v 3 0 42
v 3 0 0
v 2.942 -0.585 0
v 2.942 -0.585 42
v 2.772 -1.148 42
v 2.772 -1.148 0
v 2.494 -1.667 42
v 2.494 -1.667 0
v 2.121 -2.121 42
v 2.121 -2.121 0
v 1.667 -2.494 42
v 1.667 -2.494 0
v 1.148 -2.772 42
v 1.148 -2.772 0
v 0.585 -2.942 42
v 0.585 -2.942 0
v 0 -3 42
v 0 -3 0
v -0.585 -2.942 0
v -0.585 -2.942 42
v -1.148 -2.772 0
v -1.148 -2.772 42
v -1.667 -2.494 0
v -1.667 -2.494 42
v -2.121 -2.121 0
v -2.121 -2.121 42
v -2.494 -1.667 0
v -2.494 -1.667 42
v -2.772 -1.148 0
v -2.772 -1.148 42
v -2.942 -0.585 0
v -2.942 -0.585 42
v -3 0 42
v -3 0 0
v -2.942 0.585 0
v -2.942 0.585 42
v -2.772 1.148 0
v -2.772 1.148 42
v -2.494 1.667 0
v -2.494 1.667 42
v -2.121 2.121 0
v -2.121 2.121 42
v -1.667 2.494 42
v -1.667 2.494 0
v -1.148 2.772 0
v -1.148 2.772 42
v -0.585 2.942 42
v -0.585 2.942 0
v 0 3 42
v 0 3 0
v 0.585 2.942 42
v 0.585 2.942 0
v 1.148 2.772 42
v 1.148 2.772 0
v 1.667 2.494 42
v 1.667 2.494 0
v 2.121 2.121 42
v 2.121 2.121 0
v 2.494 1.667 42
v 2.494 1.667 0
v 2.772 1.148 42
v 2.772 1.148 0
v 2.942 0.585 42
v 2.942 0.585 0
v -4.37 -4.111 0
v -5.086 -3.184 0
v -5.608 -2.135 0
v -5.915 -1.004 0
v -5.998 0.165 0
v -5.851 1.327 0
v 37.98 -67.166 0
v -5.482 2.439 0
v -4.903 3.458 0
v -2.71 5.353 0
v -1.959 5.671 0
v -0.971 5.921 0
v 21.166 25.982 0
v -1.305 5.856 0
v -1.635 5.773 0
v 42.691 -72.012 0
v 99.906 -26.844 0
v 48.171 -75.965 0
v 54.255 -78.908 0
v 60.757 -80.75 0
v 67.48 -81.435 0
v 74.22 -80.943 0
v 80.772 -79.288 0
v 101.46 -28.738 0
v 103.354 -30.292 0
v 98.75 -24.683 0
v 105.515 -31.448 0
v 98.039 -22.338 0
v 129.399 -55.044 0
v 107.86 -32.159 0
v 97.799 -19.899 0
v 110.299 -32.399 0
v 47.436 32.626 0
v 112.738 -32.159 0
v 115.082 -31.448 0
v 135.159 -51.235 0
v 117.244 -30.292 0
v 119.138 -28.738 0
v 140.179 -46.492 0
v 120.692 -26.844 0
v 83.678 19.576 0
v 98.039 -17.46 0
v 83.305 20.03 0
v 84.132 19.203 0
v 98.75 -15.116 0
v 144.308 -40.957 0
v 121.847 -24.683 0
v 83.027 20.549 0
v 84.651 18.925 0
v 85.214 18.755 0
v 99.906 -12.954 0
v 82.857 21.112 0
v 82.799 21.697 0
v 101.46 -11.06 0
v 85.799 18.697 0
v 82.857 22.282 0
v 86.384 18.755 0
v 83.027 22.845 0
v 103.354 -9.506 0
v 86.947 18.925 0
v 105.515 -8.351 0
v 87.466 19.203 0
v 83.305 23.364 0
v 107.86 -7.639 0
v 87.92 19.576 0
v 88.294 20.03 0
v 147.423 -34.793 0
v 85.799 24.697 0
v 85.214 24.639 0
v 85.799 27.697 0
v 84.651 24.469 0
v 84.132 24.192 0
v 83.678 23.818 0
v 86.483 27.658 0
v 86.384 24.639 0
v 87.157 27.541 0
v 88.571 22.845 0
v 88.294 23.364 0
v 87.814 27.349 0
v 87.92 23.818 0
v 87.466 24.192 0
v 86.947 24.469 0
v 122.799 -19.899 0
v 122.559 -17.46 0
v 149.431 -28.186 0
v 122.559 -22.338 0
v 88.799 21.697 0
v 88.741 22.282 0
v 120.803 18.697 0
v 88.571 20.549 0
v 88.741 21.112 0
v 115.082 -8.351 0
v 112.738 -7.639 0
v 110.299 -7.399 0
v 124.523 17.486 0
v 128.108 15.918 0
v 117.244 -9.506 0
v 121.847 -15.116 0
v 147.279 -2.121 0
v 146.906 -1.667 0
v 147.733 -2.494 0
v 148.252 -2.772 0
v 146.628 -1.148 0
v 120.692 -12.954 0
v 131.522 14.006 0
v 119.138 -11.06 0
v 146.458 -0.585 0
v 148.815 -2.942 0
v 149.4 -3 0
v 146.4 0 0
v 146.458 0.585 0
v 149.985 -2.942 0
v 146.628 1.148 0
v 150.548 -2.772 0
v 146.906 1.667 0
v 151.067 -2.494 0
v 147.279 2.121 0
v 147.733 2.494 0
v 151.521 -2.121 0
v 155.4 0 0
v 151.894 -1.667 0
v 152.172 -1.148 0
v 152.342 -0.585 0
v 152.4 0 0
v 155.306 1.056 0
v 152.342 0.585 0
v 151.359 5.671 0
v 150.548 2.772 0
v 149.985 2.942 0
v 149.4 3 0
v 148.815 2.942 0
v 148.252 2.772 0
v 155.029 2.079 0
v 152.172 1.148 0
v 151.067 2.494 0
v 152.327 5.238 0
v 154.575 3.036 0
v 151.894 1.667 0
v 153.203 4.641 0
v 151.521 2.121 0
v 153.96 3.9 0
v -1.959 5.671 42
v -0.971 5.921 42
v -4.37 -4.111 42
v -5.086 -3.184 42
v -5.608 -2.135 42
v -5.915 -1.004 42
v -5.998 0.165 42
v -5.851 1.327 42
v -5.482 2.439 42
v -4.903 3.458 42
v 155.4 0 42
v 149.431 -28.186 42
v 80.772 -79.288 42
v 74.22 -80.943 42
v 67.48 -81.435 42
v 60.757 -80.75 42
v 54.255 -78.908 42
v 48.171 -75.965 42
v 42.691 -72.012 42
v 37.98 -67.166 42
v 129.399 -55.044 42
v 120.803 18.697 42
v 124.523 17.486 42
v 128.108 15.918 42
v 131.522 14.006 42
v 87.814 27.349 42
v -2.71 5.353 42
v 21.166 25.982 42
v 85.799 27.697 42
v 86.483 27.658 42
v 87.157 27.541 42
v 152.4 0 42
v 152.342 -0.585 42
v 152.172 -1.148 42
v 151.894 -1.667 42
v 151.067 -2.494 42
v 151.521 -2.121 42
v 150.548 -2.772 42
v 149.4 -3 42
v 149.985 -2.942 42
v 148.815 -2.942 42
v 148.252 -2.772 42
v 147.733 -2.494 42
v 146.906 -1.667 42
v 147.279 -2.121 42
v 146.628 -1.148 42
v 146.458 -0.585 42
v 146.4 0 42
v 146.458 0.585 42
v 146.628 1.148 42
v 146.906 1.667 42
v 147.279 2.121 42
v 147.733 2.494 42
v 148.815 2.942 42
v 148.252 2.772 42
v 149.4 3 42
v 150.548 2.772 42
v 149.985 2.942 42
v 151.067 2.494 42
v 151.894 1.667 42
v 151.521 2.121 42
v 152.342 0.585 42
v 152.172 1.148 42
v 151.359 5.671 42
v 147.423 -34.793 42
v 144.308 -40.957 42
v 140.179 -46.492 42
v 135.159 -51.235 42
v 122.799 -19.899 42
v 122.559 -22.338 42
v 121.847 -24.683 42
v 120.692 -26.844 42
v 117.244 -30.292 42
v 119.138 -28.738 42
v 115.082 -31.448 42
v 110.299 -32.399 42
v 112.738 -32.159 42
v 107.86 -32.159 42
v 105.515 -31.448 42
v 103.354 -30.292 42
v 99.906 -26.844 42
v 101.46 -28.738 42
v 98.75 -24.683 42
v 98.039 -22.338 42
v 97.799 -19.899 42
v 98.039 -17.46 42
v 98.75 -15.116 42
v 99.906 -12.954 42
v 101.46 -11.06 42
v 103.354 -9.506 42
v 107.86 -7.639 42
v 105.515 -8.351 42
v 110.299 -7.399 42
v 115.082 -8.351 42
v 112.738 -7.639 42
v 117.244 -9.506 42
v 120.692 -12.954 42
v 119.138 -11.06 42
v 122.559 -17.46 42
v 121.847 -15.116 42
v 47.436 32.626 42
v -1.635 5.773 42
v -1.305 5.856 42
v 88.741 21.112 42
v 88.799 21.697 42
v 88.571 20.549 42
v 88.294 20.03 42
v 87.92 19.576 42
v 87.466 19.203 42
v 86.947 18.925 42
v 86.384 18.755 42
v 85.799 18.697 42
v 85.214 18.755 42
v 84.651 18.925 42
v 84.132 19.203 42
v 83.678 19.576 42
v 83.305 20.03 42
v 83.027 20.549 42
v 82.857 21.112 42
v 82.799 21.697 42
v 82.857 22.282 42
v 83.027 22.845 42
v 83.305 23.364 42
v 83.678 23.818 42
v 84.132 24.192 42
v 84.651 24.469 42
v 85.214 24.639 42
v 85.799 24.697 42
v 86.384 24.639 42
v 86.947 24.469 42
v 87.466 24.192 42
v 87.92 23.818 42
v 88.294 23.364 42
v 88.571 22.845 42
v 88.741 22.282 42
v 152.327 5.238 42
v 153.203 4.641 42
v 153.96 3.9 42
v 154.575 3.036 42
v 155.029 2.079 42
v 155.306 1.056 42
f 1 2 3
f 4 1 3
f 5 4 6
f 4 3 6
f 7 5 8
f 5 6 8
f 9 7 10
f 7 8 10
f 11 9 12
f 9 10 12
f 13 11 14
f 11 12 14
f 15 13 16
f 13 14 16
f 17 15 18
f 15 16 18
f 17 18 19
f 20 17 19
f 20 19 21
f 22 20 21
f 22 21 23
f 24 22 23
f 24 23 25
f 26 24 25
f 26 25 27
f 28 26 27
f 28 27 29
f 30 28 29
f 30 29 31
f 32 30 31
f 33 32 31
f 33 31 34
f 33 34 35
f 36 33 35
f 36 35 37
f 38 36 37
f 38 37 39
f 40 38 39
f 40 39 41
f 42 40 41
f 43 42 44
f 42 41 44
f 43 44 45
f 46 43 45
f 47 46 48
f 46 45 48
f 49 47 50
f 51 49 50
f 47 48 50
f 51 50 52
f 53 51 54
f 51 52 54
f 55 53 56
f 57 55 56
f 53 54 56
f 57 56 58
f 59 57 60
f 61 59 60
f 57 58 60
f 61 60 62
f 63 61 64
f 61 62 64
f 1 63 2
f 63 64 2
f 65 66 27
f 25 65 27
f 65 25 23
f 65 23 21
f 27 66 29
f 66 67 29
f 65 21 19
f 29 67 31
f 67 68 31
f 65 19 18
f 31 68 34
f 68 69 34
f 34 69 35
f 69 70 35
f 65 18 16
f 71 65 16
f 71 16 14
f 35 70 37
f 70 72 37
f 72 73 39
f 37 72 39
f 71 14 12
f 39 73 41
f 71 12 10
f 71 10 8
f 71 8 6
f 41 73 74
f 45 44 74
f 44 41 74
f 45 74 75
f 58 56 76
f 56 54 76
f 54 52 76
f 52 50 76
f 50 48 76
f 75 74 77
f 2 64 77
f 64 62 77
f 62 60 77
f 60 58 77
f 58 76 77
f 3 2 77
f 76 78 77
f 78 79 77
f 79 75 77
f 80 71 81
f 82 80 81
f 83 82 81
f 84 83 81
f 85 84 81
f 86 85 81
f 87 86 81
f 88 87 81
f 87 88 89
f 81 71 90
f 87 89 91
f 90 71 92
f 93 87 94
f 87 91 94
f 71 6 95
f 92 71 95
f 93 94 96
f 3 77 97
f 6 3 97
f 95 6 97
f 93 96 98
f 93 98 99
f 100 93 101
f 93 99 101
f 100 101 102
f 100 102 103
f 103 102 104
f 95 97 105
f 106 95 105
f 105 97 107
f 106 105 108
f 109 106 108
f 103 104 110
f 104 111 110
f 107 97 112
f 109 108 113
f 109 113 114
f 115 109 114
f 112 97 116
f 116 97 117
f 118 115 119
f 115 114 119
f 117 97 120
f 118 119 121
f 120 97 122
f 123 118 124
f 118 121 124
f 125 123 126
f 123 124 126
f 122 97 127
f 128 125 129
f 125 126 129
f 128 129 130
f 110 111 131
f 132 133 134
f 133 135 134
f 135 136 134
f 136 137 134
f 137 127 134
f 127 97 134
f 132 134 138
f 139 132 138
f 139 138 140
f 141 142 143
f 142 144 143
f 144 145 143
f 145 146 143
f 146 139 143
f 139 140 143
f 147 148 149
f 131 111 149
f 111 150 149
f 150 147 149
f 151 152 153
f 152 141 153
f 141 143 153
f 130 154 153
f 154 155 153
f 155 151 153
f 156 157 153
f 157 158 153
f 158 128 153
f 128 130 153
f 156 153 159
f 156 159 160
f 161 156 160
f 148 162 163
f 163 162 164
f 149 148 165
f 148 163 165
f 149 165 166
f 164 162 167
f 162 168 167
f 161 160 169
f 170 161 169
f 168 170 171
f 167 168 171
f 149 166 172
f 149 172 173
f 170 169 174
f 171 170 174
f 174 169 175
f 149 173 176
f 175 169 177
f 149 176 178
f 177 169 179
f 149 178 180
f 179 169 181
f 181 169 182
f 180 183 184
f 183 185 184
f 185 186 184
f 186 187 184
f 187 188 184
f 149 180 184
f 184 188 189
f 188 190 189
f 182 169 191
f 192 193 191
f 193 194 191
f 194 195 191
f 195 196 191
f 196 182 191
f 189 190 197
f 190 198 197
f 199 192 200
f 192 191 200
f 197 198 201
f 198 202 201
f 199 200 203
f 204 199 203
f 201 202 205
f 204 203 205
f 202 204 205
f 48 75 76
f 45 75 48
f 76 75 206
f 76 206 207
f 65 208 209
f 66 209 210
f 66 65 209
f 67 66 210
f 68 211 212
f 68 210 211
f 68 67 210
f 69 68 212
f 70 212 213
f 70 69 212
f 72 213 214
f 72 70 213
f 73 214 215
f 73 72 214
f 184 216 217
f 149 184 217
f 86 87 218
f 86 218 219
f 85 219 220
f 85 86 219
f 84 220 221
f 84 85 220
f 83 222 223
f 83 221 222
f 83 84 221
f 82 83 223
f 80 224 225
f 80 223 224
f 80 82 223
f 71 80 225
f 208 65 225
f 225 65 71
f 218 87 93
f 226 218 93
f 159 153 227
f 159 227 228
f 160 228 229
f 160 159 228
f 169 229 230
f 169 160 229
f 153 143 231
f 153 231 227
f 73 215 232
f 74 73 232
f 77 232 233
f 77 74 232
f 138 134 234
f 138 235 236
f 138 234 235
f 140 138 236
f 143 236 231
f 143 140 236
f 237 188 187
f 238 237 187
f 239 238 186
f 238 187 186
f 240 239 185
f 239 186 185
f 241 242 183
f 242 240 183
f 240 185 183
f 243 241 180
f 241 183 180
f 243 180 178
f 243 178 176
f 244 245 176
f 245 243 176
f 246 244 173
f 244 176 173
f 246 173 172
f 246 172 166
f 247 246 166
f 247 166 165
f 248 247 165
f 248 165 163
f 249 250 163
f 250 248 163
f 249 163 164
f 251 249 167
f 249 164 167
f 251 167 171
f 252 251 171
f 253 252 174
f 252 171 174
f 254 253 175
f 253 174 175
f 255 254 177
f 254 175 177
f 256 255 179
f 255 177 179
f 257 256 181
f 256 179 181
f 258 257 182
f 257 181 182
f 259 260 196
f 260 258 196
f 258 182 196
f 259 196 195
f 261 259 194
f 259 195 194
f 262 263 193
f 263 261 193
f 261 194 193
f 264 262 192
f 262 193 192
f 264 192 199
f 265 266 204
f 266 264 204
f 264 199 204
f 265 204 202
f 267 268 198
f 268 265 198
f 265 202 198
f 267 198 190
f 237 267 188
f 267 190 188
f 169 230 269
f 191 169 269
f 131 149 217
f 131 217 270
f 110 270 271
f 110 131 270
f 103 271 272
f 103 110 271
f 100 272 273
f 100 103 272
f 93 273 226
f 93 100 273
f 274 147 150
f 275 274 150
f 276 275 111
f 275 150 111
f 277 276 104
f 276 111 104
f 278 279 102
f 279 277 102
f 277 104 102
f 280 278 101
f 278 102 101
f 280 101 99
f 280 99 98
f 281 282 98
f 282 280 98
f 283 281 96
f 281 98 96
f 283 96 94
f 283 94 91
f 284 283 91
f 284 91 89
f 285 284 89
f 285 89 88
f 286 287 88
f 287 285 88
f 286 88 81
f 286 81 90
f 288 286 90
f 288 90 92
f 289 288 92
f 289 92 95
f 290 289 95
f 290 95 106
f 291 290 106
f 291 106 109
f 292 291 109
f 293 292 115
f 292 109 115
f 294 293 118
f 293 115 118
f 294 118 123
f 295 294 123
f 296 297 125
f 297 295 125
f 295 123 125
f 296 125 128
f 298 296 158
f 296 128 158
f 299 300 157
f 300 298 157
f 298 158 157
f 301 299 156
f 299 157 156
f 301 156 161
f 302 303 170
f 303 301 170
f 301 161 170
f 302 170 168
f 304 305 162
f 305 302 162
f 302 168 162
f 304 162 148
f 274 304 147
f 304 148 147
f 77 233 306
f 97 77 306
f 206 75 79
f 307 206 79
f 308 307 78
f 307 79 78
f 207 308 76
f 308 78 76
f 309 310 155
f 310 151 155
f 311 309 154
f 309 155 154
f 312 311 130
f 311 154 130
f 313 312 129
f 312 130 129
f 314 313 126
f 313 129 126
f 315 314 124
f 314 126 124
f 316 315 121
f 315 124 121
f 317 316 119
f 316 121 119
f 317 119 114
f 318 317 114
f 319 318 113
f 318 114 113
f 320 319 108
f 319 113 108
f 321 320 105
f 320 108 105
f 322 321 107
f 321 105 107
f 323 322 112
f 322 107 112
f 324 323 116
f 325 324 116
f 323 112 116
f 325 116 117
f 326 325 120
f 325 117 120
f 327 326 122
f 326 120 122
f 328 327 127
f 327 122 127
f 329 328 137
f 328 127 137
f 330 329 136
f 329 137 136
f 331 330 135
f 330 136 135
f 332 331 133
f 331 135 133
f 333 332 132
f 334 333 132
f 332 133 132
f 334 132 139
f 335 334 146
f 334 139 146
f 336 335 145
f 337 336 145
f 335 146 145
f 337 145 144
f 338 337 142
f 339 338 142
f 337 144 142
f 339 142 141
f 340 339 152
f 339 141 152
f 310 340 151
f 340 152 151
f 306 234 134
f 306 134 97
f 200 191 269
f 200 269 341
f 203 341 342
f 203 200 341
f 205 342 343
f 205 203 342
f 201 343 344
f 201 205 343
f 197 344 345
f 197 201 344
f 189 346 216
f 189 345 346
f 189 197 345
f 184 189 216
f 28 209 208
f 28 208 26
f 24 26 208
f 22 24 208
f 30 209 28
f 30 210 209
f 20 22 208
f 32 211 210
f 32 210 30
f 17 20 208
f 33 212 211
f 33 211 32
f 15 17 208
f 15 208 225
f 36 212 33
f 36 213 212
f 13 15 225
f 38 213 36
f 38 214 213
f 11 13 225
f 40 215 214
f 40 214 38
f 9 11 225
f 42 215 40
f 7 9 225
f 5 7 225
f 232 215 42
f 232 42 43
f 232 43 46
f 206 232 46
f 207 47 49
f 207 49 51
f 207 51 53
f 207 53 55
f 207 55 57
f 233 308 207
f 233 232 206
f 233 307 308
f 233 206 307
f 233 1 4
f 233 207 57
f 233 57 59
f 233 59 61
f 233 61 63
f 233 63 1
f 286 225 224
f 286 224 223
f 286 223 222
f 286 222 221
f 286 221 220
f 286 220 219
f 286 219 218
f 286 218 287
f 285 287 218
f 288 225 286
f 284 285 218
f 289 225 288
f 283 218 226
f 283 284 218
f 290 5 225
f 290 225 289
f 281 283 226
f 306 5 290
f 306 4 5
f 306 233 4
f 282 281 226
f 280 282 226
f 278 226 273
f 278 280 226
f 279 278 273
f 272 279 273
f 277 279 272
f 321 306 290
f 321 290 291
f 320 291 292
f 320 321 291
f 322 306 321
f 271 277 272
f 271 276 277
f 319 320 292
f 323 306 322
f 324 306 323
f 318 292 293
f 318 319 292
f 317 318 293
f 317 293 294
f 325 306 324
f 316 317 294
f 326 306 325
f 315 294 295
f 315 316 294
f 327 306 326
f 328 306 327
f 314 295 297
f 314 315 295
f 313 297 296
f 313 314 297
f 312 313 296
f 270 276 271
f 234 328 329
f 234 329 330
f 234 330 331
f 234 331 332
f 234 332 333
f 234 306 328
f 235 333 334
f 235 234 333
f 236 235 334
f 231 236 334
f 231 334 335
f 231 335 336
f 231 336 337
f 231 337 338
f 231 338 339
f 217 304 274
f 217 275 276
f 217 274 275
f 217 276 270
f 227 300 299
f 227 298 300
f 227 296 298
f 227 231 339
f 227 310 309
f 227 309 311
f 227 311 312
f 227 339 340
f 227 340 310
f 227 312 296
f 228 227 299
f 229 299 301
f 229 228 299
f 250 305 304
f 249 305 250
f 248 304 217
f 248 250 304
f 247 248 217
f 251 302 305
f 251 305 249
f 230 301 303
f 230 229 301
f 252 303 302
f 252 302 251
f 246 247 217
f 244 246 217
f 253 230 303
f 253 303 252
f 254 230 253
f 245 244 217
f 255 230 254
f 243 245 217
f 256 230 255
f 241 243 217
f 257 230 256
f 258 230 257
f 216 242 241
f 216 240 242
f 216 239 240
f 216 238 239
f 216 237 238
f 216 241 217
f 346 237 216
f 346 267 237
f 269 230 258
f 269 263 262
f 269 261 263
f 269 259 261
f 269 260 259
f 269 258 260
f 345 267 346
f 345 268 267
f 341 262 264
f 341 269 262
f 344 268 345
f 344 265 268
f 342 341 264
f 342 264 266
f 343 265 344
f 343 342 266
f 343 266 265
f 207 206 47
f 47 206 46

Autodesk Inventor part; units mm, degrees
ref_plane "YZ Plane" through (0, 0, 0) normal (1, 0, 0) x (0, 1, 0)
ref_plane "XZ Plane" through (0, 0, 0) normal (0, 1, 0) x (-1, 0, 0)
ref_plane "XY Plane" through (0, 0, 0) normal (0, 0, 1) x (1, 0, 0)
sketch "Sketch1" plane through (0, 0, 0) normal (0, 0, 1) x (1, 0, 0)
  circle A0 centre (0, 0) radius 3
  circle A1 centre (149.4, 0) radius 3
  circle A2 centre (85.7991, 21.6971) radius 3
  circle A3 centre (110.2989, -19.8991) radius 12.5
  arc A4 (87.814, 27.3487) -> (83.7842, 27.3487) centre (85.7991, 21.6971) ccw
  arc A5 (154.885, -2.4321) -> (151.3594, 5.6711) centre (149.4, 0) ccw
  arc A6 (-0.9713, 5.9209) -> (-1.9594, -5.6711) centre (0, 0) ccw
  line L0 (-1.9594, 5.6711) -> (-0.9713, 5.9209)
  line L1 (87.814, 27.3487) -> (120.8026, 18.6971)
  line L2 (131.5219, 14.0064) -> (151.3594, 5.6711)
  line L3 (155.4, 0) -> (149.4311, -28.1861)
  arc A7 (131.5219, 14.0064) -> (120.0887, 18.8843) centre (110.2989, -19.8991) ccw
  line L4 (21.1662, 25.9822) -> (47.4365, 32.6255)
  line L5 (-4.9033, 3.458) -> (21.1662, 25.9822)
  line L6 (85.7991, 27.6971) -> (47.4365, 32.6255)
  line L7 (0, 0) -> (2.9084, 0.7355)
  line L8 (82.8907, 20.9616) -> (85.7991, 21.6971)
  arc A8 (125.9738, -56.7) -> (149.4311, -28.1861) centre (110.2989, -19.8991) ccw
  line L9 (80.7723, -79.2884) -> (129.3991, -55.0443)
  line L10 (-4.37, -4.1113) -> (37.9799, -67.1663)
  arc A9 (88.5511, 22.8914) -> (86.7834, 21.946) centre (110.2989, -19.8991) ccw
  arc A10 (154.9491, -2.282) -> (150.7621, 5.922) centre (110.2989, -19.8991) ccw
  arc A11 (33.9775, -61.2072) -> (80.7723, -79.2884) centre (68.0362, -42.6558) ccw
  point P0 (111.3369, -59.8857)
  dimension "d3" = 6
  dimension "d5" = 6
  dimension "d15" = 6
  dimension "d18" = 25
  dimension "d19" = 12
  dimension "d20" = 12
  dimension "d21" = 12
extrude "Extrusion2" add sketch "Sketch1" along normal blind 42 contours L1 A7 L2 A10 L3 A8 L9 A11 L10 A6 L5 L4 L6 A4 | L2 A5 L3 A10
properties part number "body droit"
